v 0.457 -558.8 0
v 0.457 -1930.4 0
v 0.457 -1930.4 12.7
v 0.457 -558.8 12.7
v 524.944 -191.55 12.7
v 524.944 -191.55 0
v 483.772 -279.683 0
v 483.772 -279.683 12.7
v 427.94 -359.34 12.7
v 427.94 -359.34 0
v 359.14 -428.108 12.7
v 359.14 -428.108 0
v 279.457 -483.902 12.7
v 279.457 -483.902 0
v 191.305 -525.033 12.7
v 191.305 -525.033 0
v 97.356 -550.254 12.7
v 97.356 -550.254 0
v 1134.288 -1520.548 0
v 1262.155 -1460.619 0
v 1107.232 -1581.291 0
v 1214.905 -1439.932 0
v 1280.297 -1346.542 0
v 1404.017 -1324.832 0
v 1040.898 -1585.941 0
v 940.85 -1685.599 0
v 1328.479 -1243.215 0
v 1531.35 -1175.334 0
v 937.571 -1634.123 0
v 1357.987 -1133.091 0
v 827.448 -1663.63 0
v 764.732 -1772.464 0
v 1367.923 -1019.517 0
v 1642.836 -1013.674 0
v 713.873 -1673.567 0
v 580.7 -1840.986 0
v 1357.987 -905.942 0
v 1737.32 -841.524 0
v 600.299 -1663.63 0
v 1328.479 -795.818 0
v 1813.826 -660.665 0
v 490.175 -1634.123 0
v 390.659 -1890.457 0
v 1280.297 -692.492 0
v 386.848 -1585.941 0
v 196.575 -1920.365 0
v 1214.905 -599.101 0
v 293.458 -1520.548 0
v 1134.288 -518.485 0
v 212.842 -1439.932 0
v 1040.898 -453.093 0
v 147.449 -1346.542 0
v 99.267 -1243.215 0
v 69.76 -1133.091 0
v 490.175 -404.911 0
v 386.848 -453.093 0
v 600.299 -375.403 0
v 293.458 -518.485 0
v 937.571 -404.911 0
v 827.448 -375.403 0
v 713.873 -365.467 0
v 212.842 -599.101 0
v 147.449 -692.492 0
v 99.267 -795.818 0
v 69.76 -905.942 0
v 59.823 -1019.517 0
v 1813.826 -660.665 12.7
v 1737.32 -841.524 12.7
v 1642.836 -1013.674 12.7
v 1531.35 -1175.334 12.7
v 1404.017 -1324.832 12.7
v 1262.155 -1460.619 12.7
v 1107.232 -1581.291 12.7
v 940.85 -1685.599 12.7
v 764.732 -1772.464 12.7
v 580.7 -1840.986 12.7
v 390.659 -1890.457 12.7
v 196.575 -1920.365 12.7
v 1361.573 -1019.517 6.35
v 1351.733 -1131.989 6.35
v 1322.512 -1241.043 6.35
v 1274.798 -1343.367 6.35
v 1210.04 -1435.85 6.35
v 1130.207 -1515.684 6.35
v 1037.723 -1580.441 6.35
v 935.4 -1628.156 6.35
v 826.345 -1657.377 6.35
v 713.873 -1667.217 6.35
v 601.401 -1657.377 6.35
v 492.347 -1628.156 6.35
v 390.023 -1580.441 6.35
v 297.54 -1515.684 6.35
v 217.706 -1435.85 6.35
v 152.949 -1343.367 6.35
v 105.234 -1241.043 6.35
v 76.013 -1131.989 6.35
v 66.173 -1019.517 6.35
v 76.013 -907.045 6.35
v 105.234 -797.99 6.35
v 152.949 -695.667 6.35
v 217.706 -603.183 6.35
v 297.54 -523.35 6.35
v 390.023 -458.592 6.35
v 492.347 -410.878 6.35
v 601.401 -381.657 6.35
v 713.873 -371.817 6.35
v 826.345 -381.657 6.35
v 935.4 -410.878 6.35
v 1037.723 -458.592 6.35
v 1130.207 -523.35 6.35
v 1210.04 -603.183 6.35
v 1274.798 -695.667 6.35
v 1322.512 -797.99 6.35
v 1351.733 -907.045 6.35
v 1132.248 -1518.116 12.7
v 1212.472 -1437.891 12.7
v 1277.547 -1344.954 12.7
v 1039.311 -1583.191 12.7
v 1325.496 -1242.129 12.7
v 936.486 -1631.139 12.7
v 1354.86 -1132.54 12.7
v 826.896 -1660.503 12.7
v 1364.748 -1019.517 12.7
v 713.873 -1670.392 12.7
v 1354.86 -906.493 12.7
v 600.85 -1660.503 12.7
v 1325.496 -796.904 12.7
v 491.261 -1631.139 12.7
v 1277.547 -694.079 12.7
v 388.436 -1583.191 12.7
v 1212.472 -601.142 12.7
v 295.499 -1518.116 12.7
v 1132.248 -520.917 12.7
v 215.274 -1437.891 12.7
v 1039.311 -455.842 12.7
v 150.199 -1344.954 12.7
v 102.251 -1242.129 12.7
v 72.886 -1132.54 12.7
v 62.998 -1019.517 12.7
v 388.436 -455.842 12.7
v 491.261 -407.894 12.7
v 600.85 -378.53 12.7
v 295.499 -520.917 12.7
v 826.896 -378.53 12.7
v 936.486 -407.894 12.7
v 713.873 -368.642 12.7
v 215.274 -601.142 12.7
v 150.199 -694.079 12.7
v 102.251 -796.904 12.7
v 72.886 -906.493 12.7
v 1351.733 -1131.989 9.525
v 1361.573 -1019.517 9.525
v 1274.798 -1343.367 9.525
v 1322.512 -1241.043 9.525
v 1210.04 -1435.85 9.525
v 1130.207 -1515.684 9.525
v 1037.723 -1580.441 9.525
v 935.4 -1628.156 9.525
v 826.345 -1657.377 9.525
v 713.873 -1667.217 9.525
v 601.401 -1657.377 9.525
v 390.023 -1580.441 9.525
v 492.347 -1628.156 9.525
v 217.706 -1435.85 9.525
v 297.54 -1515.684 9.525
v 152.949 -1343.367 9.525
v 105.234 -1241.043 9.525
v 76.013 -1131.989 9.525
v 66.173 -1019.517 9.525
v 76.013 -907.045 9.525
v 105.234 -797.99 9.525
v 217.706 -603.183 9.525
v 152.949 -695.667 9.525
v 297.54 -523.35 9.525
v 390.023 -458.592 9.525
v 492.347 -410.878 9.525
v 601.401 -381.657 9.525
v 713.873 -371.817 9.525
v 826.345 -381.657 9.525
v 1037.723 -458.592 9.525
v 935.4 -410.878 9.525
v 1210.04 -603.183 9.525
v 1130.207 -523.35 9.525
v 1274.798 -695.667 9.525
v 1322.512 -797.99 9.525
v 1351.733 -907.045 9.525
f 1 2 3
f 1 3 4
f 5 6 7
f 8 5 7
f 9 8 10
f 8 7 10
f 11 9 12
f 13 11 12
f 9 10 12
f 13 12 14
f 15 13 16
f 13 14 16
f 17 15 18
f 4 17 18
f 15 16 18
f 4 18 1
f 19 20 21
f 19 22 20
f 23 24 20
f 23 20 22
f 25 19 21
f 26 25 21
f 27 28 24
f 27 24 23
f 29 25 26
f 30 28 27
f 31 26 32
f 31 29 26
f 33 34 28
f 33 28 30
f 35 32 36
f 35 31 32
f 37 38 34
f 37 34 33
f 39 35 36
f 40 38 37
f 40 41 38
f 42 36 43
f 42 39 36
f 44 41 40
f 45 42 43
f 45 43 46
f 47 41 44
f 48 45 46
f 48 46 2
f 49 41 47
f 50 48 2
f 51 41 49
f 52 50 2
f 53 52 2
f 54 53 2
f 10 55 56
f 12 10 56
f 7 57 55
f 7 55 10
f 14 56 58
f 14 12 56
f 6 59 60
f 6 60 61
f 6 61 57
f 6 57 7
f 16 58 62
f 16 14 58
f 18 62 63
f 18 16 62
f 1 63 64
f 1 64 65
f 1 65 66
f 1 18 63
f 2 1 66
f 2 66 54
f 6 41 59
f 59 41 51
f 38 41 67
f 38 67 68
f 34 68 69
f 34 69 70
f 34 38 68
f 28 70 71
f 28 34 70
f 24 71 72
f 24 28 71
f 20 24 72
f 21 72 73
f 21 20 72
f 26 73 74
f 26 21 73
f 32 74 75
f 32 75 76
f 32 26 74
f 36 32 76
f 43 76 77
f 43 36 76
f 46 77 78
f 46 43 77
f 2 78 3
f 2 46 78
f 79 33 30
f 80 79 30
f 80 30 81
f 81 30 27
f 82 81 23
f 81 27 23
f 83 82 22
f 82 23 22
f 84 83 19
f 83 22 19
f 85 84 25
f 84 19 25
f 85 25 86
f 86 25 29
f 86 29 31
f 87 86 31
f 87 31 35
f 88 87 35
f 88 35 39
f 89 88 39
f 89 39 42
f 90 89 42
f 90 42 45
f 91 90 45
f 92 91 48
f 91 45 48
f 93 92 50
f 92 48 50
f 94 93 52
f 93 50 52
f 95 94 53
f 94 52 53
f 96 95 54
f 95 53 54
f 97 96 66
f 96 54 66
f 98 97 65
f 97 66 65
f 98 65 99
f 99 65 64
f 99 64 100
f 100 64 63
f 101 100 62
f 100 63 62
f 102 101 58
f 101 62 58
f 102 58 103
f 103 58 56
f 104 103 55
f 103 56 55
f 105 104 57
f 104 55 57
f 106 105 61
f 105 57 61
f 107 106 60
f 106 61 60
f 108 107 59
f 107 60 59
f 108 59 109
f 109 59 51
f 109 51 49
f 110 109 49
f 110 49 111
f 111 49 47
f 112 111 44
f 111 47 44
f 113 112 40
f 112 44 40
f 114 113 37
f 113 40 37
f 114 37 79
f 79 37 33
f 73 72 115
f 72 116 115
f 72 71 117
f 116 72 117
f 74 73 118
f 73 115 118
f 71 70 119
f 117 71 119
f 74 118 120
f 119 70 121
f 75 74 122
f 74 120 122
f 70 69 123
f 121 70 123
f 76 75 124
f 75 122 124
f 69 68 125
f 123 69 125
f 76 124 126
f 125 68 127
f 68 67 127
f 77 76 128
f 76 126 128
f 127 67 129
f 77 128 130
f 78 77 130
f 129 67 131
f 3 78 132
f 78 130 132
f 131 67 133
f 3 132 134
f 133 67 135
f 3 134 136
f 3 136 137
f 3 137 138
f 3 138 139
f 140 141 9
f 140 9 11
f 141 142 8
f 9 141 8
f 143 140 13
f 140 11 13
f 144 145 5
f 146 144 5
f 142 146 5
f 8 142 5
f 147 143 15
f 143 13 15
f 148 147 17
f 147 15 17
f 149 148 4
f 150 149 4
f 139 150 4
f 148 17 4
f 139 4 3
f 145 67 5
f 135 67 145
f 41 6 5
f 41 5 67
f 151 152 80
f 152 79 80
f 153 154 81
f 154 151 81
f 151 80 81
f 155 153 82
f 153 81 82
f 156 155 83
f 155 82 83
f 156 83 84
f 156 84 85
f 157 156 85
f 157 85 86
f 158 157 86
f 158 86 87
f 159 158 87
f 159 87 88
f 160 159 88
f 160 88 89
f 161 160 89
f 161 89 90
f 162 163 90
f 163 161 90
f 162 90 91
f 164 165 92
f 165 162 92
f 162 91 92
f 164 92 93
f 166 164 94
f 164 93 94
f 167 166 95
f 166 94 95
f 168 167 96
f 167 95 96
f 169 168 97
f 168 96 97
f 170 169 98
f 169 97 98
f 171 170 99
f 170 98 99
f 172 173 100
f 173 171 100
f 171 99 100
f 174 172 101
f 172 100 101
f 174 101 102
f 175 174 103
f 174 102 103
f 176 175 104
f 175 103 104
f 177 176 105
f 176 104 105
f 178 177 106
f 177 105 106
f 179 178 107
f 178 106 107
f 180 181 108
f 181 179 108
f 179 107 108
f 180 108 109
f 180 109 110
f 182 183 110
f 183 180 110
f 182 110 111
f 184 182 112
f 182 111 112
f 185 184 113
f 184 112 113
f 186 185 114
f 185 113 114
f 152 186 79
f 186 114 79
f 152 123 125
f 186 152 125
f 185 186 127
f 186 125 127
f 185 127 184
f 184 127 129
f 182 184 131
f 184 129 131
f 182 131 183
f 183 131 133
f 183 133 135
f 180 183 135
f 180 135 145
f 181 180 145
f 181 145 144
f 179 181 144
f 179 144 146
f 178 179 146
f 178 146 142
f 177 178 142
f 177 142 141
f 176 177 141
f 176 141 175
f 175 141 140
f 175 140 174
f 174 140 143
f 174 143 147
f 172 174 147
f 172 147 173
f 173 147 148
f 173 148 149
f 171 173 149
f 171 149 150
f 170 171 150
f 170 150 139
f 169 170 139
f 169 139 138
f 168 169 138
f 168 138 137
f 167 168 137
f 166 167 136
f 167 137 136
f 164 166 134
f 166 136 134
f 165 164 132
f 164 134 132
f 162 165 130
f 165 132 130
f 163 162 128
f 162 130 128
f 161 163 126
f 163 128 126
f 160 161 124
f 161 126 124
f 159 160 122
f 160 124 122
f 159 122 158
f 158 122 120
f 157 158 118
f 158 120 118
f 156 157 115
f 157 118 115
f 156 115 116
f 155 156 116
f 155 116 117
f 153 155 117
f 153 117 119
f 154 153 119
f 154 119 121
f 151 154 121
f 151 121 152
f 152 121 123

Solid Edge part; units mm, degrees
sketch "Sketch1" plane through (0, 0, 0) normal (0, 0, 1) x (1, 0, 0)
  line L0 (524.9437, -191.5504) -> (1813.8262, -660.6653)
  line L1 (0.4572, -1930.4) -> (0.4572, -558.7998)
  arc A0 (1813.8262, -660.6653) -> (0.4572, -1930.4) centre (-0.0001, 0) cw
  arc A1 (524.9437, -191.5504) -> (0.4572, -558.7998) centre (0, 0) cw
  circle A2 centre (713.8732, -1019.5166) radius 647.7
extrude "Protrusion1" add sketch "Sketch1" along normal blind 12.7
chamfer "Chamfer_1" distance 3.175 angle 45 1 edges at (66.1732, -1019.5166, 12.7)
chamfer "Chamfer_2" distance 6.35 angle 45 1 edges at (66.1732, -1019.5166, 0)
